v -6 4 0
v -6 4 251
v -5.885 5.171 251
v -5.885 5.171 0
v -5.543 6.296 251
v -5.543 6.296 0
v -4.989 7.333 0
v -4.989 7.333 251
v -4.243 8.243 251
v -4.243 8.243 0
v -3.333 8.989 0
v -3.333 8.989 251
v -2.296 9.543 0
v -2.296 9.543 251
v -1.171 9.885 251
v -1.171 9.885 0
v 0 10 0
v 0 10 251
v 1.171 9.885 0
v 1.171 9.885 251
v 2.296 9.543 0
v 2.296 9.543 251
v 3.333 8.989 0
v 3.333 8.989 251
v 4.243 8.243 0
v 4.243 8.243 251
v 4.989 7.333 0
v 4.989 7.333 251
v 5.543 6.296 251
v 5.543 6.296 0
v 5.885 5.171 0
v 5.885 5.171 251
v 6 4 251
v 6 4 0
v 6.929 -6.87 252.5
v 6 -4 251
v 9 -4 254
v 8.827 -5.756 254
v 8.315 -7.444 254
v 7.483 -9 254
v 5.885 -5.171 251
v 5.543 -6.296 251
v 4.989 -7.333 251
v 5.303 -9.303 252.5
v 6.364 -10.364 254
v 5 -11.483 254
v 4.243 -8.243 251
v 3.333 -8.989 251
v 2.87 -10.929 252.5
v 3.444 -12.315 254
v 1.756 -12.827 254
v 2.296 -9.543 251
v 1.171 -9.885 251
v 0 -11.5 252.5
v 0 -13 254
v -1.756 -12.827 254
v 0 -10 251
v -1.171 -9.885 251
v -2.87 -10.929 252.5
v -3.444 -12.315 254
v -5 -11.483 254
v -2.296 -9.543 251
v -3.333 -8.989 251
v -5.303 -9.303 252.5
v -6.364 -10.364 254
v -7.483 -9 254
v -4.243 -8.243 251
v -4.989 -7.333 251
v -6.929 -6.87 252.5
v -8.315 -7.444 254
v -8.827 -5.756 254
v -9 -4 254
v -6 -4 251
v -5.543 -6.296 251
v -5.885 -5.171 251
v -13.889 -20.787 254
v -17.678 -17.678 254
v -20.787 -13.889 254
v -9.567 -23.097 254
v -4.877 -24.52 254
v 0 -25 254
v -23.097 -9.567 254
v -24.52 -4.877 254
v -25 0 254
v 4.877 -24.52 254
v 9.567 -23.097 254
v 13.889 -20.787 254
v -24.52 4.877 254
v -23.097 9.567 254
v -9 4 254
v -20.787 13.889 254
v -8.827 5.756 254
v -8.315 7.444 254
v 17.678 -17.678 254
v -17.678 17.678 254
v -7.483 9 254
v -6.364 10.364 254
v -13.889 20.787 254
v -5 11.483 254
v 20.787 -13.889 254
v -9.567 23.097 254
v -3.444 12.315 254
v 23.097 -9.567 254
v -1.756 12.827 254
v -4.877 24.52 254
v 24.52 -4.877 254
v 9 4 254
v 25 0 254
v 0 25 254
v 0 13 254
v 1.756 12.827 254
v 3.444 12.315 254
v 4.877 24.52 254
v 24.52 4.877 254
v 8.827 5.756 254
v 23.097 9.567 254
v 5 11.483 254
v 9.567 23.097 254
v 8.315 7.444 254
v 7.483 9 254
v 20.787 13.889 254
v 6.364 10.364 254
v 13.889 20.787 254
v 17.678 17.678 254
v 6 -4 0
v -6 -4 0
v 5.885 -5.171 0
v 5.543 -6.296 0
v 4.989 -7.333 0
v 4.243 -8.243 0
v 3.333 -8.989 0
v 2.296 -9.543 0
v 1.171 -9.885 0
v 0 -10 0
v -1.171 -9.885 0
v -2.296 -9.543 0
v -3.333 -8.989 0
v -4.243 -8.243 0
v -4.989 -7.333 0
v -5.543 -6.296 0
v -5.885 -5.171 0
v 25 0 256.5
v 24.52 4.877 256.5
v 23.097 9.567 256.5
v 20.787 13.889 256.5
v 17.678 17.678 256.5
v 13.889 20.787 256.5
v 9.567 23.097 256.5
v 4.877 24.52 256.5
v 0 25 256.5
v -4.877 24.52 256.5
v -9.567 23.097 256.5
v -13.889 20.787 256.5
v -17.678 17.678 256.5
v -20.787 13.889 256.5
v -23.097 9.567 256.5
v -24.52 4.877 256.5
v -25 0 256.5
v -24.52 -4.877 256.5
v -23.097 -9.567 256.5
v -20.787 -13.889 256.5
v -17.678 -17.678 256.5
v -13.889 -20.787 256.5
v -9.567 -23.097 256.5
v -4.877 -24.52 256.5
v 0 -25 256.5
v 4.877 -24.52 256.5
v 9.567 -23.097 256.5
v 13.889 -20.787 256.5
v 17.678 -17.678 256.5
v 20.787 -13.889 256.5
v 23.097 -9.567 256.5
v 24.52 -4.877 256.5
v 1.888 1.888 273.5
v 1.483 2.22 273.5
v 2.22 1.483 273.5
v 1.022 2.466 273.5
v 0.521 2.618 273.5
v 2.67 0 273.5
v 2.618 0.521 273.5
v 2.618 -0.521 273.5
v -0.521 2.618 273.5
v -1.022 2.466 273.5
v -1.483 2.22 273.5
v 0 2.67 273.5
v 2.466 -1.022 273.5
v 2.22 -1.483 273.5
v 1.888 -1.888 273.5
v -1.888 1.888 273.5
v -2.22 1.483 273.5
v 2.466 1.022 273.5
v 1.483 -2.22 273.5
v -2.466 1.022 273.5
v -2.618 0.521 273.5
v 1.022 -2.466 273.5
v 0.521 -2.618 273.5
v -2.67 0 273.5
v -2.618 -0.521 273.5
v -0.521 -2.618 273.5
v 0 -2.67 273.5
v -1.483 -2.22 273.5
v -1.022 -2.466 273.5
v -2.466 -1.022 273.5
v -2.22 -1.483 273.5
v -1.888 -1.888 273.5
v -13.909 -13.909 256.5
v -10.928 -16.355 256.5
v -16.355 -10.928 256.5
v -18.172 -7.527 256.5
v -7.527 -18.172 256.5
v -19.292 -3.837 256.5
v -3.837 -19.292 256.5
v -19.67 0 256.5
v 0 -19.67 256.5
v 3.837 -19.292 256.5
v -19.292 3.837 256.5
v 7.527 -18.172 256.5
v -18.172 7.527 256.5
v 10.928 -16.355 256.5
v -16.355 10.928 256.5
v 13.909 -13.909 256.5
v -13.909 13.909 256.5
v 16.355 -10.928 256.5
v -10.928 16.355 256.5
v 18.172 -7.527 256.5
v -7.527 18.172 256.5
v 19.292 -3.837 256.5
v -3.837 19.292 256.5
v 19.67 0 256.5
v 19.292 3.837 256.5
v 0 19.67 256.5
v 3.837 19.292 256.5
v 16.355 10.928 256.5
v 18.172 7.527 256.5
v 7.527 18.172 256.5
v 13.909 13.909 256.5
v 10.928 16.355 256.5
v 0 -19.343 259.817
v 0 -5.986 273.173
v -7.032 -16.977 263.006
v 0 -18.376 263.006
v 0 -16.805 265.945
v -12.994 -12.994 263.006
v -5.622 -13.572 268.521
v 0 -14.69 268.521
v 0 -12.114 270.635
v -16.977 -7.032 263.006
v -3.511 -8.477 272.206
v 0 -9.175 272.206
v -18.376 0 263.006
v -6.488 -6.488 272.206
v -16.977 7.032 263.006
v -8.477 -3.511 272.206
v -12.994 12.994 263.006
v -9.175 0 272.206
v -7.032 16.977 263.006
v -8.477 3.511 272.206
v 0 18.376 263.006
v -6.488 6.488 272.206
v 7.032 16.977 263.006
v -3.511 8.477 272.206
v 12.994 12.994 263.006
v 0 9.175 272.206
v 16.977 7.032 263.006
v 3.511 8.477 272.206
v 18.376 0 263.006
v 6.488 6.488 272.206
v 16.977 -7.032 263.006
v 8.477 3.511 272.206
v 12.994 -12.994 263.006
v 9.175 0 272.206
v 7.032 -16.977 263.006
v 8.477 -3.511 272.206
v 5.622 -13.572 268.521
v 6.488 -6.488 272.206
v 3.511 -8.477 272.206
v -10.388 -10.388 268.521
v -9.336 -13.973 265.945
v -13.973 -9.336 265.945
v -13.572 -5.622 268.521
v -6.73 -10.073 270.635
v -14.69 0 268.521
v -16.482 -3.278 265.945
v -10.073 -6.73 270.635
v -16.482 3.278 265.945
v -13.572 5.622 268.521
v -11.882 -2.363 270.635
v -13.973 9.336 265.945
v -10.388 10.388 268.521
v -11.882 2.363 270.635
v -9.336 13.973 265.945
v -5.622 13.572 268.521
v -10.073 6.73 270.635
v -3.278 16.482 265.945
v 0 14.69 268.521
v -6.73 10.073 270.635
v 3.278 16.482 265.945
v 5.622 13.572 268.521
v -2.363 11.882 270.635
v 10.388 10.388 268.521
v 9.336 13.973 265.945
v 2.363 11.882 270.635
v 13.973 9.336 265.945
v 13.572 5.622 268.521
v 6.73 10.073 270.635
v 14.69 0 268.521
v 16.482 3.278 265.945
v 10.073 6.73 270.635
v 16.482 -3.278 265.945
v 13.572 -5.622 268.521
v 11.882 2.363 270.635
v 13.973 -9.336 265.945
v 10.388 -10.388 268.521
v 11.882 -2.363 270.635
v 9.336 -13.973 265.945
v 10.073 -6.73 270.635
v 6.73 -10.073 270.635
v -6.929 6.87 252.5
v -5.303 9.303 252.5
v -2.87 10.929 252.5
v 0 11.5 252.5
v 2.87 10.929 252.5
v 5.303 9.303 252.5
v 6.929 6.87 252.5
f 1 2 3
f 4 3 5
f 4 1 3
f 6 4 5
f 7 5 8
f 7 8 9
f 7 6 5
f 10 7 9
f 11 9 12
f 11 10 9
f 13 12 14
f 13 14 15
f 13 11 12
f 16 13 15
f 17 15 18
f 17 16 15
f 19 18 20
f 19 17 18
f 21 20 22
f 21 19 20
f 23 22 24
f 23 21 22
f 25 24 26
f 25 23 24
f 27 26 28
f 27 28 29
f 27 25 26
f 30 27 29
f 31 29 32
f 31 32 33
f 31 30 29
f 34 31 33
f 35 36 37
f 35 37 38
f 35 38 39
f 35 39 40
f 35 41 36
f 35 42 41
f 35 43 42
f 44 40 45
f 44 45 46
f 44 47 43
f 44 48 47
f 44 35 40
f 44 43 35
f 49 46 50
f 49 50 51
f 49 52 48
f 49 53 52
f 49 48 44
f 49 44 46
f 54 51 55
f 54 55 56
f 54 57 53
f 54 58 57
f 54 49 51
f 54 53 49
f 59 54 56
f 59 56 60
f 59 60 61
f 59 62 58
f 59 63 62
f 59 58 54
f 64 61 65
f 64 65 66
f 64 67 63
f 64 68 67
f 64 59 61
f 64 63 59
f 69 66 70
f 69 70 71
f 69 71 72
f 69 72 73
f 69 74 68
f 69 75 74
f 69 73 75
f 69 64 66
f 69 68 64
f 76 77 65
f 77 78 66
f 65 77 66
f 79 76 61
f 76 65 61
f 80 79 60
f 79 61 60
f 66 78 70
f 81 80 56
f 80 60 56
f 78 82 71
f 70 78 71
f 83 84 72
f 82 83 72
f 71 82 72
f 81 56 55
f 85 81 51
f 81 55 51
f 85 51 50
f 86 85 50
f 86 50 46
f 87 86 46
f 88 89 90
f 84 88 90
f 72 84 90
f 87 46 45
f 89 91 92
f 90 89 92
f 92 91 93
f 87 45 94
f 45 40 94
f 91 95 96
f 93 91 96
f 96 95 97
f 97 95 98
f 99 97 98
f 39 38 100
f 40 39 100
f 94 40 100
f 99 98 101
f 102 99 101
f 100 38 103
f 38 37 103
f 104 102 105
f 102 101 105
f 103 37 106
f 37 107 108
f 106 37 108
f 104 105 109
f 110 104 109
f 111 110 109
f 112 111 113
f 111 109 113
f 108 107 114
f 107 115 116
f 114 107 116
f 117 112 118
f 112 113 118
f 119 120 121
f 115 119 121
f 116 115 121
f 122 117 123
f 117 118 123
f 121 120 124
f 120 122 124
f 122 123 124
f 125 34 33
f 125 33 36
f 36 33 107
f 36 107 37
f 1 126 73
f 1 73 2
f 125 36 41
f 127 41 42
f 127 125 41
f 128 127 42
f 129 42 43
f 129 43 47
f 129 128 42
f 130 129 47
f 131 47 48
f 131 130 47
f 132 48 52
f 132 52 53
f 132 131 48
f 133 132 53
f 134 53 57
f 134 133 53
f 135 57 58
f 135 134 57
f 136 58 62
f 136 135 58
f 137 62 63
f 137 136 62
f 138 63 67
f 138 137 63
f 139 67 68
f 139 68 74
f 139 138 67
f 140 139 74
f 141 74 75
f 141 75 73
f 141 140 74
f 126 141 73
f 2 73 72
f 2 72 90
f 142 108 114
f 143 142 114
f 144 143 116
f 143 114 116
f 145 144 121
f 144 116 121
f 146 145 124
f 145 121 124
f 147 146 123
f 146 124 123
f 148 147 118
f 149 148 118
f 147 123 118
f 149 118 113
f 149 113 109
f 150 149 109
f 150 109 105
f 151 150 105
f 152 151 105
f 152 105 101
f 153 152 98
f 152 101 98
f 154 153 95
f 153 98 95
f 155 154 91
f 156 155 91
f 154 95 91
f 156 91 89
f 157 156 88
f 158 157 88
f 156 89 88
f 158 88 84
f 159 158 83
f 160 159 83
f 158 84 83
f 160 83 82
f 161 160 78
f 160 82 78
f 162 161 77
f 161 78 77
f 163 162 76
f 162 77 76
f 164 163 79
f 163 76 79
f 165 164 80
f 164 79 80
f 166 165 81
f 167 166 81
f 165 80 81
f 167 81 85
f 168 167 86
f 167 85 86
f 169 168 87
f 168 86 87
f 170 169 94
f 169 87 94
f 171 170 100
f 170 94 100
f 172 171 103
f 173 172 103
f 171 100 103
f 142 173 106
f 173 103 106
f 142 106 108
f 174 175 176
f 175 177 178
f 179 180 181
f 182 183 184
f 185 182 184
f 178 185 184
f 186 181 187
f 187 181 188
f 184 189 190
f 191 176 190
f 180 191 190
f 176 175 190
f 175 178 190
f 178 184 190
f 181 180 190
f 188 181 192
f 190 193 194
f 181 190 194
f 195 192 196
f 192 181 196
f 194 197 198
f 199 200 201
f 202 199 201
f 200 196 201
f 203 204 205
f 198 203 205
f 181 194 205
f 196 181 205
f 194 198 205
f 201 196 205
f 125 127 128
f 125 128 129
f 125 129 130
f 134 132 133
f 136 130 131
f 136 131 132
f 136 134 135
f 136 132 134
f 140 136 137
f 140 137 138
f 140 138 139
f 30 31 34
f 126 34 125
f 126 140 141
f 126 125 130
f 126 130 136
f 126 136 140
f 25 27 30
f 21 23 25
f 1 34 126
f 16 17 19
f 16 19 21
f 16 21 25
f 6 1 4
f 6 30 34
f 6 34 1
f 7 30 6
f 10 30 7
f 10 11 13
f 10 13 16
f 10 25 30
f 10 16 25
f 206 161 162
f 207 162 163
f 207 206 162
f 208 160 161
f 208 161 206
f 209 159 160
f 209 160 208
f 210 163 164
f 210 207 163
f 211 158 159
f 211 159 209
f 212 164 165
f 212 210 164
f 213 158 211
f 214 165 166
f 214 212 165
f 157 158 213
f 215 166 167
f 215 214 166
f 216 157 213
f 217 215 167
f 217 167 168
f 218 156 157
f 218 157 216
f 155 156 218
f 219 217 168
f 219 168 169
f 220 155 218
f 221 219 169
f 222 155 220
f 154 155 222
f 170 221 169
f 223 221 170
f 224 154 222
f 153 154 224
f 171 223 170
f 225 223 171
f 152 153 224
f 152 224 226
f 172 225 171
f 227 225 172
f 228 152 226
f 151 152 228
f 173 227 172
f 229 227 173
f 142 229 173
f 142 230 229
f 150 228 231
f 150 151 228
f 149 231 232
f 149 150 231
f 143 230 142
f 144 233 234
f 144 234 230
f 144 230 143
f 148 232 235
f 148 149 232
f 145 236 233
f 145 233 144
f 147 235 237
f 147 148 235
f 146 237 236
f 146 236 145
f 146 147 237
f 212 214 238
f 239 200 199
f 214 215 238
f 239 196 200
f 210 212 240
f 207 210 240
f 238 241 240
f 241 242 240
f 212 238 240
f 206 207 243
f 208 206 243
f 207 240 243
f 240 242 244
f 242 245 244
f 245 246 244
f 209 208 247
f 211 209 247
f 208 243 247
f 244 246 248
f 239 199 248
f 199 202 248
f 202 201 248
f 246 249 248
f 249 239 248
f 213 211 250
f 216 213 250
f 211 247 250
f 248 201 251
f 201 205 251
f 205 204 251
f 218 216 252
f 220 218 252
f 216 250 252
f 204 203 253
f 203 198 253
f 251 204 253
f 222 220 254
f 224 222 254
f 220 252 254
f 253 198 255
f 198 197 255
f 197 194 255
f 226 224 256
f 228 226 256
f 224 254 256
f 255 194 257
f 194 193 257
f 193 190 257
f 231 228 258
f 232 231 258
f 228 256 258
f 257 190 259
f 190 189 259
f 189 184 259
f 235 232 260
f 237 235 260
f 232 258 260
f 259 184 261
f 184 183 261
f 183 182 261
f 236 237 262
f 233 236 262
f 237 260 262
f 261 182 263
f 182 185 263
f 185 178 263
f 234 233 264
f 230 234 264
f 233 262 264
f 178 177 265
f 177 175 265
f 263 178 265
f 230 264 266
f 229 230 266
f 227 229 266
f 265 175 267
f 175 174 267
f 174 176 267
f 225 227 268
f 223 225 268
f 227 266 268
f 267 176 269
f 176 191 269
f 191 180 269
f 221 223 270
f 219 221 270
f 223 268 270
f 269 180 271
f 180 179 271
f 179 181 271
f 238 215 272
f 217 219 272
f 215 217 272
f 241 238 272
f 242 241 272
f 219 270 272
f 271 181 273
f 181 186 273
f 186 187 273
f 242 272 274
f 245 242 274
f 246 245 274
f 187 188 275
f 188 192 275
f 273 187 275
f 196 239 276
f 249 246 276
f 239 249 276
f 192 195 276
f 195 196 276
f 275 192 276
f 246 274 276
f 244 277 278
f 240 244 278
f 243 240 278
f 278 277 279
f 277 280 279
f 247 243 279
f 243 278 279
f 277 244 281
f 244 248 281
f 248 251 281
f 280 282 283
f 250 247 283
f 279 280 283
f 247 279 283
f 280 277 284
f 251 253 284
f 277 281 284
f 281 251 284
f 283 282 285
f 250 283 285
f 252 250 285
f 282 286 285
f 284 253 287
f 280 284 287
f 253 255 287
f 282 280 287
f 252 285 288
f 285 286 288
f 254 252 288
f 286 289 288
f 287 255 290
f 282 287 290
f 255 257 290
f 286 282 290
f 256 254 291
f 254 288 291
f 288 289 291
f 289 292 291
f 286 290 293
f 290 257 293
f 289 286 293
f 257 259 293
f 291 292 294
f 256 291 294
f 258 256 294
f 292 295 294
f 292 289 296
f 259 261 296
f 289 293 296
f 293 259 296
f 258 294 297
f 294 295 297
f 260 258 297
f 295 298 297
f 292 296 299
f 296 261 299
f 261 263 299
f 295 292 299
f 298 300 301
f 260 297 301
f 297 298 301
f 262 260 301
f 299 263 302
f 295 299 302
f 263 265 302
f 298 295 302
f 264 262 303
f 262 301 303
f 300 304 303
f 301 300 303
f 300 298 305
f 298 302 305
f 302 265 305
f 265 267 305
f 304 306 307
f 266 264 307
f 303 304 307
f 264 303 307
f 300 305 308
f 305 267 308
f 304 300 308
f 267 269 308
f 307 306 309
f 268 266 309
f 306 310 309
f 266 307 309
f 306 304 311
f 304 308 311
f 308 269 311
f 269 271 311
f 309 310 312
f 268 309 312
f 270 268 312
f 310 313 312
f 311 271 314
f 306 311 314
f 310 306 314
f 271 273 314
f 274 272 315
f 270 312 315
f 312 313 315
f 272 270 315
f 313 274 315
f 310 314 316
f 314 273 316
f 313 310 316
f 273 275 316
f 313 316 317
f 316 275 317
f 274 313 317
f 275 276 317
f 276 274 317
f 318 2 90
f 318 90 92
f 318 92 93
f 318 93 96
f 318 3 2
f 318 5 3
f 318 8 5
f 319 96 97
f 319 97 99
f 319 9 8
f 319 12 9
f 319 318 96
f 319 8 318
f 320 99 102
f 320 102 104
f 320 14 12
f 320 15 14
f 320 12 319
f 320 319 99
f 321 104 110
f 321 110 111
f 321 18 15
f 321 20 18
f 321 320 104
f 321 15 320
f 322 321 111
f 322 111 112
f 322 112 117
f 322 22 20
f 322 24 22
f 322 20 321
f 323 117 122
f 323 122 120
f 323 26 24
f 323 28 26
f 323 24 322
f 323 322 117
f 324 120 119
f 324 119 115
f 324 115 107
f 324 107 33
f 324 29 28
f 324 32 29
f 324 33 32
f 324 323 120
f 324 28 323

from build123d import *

# Parameters (mm, degrees)
EXTRUDE_1_DEPTH = 254
SKETCH_3_R      = 25
EXTRUDE_2_DEPTH = 2.5
CHAMFER_1_SIZE  = 3


with BuildPart() as part:
    # 草图2 → 凸台-拉伸1 (new body)
    with BuildSketch(Plane.XY):
        with BuildLine():
            Line((6, 4), (6, -4))
            ThreePointArc((6, -4), (0, -10), (-6, -4))
            Line((-6, -4), (-6, 4))
            ThreePointArc((-6, 4), (0, 10), (6, 4))
        make_face()
    extrude(amount=EXTRUDE_1_DEPTH)

    # 草图3 → 凸台-拉伸2 (add)
    with BuildSketch(Plane.XY.offset(254)):
        Circle(SKETCH_3_R)
    extrude(amount=EXTRUDE_2_DEPTH)

    # 倒角1
    chamfer_1_edges = [part.edges().sort_by_distance(p)[0] for p in [
        (0, -10, 254),
        (6, 0, 254),
        (0, 10, 254),
        (-6, 0, 254),
    ]]
    chamfer(chamfer_1_edges, length=CHAMFER_1_SIZE)

    # 草图4 → 旋转1 (revolve)
    with BuildSketch(Plane(origin=(0, 0, 0), x_dir=(0, 0, -1), z_dir=(1, 0, 0))):
        with BuildLine():
            Line((-256.5, 0), (-256.5, -19.669640386))
            ThreePointArc((-256.5, -19.669640386), (-268.52081528, -14.690455667), (-273.5, -2.669640386))
            Line((-273.5, -2.669640386), (-273.5, 0))
            Line((-273.5, 0), (-256.5, 0))
        make_face()
    revolve(axis=Axis((0, 0, 273.5), (0, 0, -1)))


solid = part.part
